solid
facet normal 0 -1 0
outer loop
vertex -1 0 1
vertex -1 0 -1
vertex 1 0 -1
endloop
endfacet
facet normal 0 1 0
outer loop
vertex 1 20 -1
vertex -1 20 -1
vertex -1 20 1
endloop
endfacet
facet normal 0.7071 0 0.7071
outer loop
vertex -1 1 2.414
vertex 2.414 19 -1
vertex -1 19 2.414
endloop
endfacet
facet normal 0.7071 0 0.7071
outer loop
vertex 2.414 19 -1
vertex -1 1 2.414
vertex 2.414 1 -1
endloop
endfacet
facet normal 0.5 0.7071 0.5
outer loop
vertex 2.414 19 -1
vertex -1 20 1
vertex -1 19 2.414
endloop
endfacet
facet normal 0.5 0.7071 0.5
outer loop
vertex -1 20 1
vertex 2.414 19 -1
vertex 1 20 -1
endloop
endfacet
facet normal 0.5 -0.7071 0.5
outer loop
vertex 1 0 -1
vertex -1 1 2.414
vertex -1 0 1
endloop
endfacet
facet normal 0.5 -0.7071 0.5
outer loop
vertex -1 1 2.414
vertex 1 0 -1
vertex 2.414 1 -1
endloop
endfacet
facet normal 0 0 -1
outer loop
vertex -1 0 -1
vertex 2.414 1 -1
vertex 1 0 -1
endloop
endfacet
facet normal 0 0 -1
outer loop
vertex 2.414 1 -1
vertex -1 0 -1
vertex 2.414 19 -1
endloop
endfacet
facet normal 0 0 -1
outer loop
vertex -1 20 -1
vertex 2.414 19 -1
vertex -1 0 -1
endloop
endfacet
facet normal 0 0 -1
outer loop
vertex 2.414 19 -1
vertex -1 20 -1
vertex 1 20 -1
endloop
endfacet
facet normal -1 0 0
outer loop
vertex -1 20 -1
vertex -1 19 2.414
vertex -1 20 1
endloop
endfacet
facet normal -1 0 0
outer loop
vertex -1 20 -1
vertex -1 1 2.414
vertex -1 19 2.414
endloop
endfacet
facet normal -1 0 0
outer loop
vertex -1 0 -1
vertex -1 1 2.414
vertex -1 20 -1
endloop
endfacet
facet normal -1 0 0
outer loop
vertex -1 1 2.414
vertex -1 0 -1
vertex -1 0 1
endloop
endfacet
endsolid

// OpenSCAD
// file: triangle.scad
// Nathanael Lane
// 2015.1.22


/*
 * -h: height of prism
 * -b: length of base
 * -d: base-to-apex distance
 * -s: side length
 * -a: angle of apex corner
 * -if more than two of b, d, s, and a are defined, the outcome is undefined
 */
module _triangle(b = 0, d = 0, s = 0, a = 0, base_origin = false){
	
	adBase = tan(a / 2) * d * 2;
	asBase = sin(a / 2) * s * 2;
	dsBase = sqrt((s * s) - (d * d));
	abHeight = (b / 2) / tan(a / 2);
	asHeight = cos(a / 2) * s;
	bsHeight = sqrt((s * s) - (b * b));

	baseLUT = [b, asBase, b, adBase, b, dsBase];
	heightLUT = [abHeight, asHeight, bsHeight, d, d, d];

	base = baseLUT[
		min((sign(b) + sign(s) * 2 + sign(d) * 4) - 1, 5)
	];
	height = heightLUT[
		min((sign(b) + sign(s) * 2 + sign(d) * 4) - 1, 5)
	];

	translate([0, base_origin ? height : 0, 0])
			polygon([
				[0, 0], 
				[base / 2, -height], 
				[-base / 2, -height]
			]);	
}

module triangle(h = 1, b = 0, d = 0, s = 0, a = 0, base_origin = false, center = false){

	translate([0, 0, center ? -h /2 : 0])
		linear_extrude(height = h)
			_triangle(b = b, d = d, s = s, a = a, base_origin = base_origin);	
}


$fa = 5;
$fs = 0.05;

triangle(h = 3, b = 10, a = 60, baseOrigin = true, center = true);
// main file
// Nathanael Lane
// 2015.3.17

use <triangle.scad>

module _square(xyz, cr, center = false){

	hull()
		translate(center ? [0, 0, 0] : xyz / 2)
			for(x = [-1, 1])
				for(y = [-1, 1])
					translate([(xyz[0] / 2 - cr) * x, (xyz[1] / 2 - cr) * y, 0])
						children();
}


module chamfered_square(xyz = [2, 2, 2], cr = 1, center){

	_square(xyz = xyz, cr = cr, center = center)
		rotate([0, 0, 45])
			cube([cr * sqrt(2), cr * sqrt(2), xyz[2]], center = true);
}


module rounded_square(xyz = [2, 2, 2], cr = 1, center){

	_square(xyz = xyz, cr = cr, center = center)
		cylinder(r = cr, h = xyz[2], center = true);
}


module _cube(xyz, cr, center = false){

	hull()
		translate(center ? [0, 0, 0] : xyz / 2)
			for(x = [-1, 1])
				for(y = [-1, 1])
					for(z = [-1, 1])
						translate([(xyz[0] / 2 - cr) * x, (xyz[1] / 2 - cr) * y, (xyz[2] / 2 - cr) * z])
							children();

}


module chamfered_cube(xyz = [2, 2, 2], cr = 1, center){

	p = [
		[0, 0, cr],
		[0, cr, 0],
		[cr, 0, 0],
		[0, -cr, 0],
		[-cr, 0, 0],
		[0, 0, -cr]
	];

	t = [
		[0, 1, 2],
		[0, 2, 3],
		[0, 3, 4],
		[0, 4, 1],

		[5, 2, 1],
		[5, 1, 4],
		[5, 4, 3],
		[5, 3, 2]
	];

	_cube(xyz = xyz, cr = cr, center = center)
		polyhedron(points = p, faces = t, convexity = 2);
}


module rounded_cube(xyz = [2, 2, 2], cr = 1, center){

	_cube(xyz = xyz, cr = cr, center = center)
		sphere(r = cr);
}


module _cylinder(h, d, r, cr, center = false){

	_r = (d == 0) ? r : d / 2;

	hull()
		translate([0, 0, center ? 0 : h / 2])
			for(a = [0, 180])
				rotate([a, 0, 0])
					translate([0, 0, h / 2 - cr])
						rotate_extrude()
							translate([_r - cr, 0, 0])
								children();
}


module chamfered_cylinder(h = 4, d = 0, r = 2, cr = 1, center){

	

	_cylinder(h = h, cr = cr, r = r, d = d, center = center)
		rotate([0, 0, 135])
			_triangle(s = cr, a = 90);
}


module rounded_cylinder(h = 4, d = 0, r = 3, cr = 1, center){

	_cylinder(h = h, d = d, r = r, cr = cr, center = center)
		intersection(){
		
			square([cr, cr]);
		
			circle(r = cr);
		}
}


module chamfer(cr = 1, l = 3, center = false){

	
	intersection(){

		rotate([0, -45, 0])
			translate([-cr * 3, center ? -l / 2 : 0, -cr * 3])
				chamfered_square([cr * 4, l, cr * 6], cr = cr);

		translate([-cr, center ? -l / 2 : 0, -cr])
			cube([cr * 4, l, cr * 4]);
	}
}

module sexy_cube(xyz = [3, 3, 3], cr = 1, fr = 1, center = false){

	translate(!center ? xyz / 2 : [0, 0, 0])
		hull()
			for(x = [-1, 1])
				for(y = [-1, 1])
					translate([x * (xyz[0] / 2 - fr), y * (xyz[1] / 2 - fr), 0])
						chamfered_cylinder(h = xyz[2], center = true, cr = cr, r = fr);
}


*sexy_cube([20, 40, 30], cr = 3, fr = 14);

chamfer(l = 20);

*rounded_square([5, 5, 5]);

$fa = 6;
$fs = 0.1;
